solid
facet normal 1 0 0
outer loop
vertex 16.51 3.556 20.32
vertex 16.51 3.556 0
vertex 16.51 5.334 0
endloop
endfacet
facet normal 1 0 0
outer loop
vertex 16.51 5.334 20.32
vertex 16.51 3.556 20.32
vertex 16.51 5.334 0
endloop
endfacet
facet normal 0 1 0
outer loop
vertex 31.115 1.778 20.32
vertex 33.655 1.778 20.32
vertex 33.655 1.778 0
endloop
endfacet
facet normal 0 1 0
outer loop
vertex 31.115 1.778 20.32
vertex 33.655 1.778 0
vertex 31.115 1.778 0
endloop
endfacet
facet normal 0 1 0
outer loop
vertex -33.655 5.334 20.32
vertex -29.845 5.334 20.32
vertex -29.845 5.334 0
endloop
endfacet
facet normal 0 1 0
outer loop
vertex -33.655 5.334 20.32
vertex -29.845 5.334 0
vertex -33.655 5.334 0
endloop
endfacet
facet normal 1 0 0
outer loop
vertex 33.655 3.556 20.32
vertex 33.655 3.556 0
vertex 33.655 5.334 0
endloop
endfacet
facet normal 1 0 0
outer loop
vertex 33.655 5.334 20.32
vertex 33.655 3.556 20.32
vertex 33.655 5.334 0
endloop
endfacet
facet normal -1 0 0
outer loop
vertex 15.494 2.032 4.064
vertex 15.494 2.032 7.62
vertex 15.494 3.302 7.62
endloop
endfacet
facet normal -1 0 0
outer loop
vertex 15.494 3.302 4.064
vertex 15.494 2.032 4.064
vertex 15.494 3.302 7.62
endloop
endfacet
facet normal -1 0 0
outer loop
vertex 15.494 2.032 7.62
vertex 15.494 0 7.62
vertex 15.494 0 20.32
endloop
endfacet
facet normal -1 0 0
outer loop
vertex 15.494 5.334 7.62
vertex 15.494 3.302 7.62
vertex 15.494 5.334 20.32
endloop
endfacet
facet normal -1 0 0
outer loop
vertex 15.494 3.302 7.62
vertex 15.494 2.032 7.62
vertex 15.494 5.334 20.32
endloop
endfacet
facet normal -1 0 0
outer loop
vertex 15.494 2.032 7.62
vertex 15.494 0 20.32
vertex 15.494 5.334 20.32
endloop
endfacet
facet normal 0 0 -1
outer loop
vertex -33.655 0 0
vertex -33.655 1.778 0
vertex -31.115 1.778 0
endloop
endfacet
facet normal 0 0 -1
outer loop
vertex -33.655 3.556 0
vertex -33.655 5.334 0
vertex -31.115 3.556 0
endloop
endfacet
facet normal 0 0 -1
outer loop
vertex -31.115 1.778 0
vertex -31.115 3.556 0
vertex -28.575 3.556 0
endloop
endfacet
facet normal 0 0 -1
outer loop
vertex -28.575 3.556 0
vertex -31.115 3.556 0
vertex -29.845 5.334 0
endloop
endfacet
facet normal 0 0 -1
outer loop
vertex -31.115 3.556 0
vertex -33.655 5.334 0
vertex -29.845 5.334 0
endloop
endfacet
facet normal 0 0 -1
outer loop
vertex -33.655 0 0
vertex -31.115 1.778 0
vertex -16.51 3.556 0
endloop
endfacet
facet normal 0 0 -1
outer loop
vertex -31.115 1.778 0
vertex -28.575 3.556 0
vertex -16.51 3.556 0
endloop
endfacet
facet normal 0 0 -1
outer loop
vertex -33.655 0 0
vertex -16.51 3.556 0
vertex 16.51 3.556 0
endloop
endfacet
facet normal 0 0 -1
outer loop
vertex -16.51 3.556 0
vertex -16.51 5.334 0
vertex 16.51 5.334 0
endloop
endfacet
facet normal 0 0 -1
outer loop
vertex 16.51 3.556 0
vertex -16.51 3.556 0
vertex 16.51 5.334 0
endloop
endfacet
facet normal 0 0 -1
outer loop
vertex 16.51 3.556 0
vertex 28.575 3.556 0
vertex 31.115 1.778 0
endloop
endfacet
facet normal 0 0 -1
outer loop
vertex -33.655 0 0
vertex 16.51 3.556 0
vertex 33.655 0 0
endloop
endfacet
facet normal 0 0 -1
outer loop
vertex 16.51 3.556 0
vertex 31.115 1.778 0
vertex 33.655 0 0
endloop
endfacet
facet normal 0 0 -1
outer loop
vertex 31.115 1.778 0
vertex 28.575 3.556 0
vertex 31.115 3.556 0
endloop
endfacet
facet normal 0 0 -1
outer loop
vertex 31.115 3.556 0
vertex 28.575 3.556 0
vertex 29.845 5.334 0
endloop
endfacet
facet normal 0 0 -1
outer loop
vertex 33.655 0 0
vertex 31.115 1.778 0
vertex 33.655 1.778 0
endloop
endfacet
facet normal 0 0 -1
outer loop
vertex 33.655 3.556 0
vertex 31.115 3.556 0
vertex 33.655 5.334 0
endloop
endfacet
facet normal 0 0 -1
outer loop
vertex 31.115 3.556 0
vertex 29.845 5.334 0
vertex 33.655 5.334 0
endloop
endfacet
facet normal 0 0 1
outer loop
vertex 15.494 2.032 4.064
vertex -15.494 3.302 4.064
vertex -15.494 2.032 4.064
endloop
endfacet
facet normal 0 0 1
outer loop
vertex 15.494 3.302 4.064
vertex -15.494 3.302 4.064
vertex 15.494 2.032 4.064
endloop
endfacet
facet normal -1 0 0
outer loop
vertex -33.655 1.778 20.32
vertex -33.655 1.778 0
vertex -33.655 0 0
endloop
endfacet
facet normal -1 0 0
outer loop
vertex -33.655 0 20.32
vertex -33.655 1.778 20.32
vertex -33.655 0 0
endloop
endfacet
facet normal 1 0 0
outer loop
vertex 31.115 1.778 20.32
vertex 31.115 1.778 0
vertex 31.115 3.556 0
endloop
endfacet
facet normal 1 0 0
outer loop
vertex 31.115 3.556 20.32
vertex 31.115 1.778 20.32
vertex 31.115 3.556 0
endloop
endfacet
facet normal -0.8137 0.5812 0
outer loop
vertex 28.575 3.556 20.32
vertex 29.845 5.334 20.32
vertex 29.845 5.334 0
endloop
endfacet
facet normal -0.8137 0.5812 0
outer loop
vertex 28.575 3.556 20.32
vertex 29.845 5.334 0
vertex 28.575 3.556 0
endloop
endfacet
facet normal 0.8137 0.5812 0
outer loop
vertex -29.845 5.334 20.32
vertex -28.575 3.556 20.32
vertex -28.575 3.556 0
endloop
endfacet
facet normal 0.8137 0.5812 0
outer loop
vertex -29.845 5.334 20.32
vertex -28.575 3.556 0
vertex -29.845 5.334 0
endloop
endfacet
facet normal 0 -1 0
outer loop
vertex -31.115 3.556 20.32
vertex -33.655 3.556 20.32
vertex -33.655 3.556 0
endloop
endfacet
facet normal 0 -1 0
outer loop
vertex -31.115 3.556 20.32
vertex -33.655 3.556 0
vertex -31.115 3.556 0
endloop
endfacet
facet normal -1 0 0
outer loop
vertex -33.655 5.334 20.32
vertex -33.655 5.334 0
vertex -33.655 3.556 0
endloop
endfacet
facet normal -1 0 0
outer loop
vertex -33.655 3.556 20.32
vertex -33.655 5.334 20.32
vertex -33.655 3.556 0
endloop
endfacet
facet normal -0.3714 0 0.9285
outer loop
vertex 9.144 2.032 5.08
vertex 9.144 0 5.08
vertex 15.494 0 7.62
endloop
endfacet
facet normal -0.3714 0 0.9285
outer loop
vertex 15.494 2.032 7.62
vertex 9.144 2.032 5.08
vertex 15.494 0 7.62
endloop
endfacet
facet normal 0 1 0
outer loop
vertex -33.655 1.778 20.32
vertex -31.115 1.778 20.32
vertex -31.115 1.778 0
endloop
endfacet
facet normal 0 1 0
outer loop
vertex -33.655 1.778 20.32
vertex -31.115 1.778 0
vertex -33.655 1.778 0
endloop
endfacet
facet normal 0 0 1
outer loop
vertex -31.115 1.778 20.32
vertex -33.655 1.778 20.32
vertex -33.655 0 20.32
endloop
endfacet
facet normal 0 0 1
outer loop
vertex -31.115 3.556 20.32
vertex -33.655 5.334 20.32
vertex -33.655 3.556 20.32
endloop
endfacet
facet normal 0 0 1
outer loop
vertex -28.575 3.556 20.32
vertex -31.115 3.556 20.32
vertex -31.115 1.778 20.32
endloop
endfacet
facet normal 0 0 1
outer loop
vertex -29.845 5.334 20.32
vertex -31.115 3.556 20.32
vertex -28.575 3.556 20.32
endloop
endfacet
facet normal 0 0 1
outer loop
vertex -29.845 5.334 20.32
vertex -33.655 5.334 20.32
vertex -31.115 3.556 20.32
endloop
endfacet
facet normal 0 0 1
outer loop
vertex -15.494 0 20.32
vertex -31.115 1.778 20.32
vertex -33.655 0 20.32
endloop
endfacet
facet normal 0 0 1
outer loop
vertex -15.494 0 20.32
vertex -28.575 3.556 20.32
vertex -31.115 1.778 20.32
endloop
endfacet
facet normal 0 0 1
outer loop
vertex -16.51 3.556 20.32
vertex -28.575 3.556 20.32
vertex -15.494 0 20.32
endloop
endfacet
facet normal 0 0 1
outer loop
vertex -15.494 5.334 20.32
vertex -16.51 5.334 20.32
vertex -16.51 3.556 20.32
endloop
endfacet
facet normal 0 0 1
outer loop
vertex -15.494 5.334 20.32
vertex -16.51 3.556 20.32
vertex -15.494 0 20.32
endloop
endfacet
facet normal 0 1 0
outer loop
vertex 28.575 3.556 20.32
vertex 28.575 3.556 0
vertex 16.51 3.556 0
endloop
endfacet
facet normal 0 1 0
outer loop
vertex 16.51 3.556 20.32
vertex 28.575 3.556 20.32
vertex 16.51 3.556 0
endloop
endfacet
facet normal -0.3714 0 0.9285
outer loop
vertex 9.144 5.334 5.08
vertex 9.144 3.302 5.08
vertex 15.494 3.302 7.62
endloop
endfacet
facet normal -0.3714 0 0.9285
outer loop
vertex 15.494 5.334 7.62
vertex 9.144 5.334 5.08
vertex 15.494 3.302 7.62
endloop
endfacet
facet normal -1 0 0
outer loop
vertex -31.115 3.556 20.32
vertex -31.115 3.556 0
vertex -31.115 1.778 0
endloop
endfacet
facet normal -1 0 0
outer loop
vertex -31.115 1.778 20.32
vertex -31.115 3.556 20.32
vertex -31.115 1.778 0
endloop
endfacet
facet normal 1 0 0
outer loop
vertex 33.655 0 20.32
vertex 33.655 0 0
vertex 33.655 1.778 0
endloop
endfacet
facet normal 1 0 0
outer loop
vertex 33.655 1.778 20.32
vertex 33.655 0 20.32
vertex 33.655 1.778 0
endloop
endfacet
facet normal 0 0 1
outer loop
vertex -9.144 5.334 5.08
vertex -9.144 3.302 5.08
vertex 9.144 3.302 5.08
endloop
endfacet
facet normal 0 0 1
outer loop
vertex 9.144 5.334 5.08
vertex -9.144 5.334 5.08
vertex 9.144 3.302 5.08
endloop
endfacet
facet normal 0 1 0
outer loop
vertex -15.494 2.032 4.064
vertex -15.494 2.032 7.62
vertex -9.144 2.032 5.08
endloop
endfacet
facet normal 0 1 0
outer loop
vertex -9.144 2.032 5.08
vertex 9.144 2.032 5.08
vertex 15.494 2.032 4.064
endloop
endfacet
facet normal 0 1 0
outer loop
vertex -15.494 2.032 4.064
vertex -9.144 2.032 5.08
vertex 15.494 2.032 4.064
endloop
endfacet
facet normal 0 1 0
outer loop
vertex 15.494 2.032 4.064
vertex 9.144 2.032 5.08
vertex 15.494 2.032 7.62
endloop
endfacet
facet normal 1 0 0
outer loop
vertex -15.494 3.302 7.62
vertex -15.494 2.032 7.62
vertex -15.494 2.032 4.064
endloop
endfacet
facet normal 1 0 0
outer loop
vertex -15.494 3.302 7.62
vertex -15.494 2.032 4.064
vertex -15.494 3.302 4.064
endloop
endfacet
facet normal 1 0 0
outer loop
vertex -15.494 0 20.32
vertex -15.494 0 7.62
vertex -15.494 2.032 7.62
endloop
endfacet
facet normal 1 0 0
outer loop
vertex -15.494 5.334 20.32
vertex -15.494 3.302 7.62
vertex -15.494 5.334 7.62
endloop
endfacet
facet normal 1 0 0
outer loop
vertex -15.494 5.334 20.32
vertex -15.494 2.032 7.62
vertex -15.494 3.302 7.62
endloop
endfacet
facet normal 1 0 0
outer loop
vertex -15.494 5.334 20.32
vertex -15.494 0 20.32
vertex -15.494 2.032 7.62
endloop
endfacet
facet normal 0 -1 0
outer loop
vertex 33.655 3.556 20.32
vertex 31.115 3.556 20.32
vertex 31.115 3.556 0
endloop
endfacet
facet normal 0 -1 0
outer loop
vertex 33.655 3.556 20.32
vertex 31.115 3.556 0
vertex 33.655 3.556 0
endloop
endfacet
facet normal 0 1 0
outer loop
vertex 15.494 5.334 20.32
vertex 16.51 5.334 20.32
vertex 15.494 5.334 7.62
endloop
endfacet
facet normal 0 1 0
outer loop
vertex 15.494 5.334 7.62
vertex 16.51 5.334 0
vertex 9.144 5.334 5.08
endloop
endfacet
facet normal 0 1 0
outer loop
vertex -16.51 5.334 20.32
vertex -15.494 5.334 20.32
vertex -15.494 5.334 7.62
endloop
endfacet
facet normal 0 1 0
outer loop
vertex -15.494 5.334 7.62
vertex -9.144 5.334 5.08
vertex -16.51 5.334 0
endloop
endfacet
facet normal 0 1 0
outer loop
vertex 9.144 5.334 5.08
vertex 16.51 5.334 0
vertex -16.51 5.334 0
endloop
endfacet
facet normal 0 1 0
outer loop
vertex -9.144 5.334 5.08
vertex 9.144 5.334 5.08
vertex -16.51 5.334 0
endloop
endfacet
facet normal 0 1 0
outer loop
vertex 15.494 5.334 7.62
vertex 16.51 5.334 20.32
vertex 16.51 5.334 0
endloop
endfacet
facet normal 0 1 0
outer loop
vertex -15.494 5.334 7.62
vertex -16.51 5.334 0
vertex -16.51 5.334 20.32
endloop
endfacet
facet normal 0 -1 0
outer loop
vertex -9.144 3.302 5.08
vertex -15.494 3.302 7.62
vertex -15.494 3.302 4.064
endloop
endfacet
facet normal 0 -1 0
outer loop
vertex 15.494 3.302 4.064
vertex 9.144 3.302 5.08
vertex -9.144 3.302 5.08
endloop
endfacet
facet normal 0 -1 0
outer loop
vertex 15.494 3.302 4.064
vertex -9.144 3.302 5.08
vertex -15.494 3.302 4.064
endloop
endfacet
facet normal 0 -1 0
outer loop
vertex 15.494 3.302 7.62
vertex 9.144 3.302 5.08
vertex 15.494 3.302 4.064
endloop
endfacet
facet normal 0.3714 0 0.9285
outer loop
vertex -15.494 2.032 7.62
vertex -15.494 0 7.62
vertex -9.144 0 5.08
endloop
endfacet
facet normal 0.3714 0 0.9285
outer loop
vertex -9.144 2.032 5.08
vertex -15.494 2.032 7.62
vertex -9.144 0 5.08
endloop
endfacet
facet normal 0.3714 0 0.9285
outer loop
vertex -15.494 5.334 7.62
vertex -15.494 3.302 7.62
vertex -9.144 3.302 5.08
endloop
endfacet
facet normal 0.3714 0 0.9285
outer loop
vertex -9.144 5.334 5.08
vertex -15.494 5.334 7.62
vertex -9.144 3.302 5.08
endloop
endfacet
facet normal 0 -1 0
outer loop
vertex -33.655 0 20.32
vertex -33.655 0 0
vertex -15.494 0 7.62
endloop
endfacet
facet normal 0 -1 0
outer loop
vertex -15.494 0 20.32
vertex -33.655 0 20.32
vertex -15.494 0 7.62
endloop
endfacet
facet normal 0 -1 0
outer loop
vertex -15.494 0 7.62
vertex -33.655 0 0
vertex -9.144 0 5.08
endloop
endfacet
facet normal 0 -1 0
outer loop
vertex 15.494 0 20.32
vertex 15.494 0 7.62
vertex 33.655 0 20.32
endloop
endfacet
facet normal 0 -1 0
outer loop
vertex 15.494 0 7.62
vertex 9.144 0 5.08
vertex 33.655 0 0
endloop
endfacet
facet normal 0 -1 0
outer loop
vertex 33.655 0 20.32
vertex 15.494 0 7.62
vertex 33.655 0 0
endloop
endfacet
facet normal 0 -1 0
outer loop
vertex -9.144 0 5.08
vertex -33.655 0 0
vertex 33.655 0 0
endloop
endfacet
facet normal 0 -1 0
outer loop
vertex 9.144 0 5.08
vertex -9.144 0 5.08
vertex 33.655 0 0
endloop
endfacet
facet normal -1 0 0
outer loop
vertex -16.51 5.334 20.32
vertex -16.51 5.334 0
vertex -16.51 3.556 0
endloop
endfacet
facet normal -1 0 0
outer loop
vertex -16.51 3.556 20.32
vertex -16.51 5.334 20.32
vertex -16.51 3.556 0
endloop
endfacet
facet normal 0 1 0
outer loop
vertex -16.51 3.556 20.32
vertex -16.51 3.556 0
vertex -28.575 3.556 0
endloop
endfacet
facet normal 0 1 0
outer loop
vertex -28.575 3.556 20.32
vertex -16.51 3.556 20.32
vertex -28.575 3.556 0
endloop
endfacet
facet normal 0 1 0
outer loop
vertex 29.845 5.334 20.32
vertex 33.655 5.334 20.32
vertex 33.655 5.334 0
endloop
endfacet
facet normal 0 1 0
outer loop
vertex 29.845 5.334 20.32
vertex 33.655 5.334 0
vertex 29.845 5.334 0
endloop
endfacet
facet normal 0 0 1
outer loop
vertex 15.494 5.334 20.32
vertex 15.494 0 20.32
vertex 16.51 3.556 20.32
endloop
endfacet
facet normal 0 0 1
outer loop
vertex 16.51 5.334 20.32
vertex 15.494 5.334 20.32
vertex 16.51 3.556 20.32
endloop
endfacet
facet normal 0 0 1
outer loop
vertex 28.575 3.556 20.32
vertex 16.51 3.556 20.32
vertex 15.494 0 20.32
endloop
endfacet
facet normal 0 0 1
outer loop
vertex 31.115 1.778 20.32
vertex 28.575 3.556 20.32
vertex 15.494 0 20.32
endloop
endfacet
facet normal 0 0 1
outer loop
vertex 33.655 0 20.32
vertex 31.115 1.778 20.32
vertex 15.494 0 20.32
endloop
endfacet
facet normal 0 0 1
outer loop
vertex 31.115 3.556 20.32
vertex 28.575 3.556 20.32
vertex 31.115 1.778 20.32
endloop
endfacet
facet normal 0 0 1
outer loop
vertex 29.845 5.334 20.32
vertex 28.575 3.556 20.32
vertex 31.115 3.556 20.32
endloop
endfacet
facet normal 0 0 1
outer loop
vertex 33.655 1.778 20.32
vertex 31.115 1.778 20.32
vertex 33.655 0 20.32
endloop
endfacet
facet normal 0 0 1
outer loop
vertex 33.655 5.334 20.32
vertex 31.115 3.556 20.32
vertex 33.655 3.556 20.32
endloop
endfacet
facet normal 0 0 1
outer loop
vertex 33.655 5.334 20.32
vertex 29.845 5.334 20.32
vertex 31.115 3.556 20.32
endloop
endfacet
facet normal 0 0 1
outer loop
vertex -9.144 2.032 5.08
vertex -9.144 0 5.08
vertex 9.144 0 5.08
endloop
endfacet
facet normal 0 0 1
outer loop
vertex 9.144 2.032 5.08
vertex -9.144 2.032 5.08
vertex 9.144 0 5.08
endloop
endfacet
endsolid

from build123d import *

# Parameters (mm, degrees)
F1_DEPTH = 20.32
F2_W     = 30.988
F2_H     = 5.334
F3_DEPTH = 12.7
F4_W     = 30.988
F4_H     = 1.27
F5_DEPTH = 3.556
F7_DEPTH = 5.334


with BuildPart() as f1:
    # F0 (on Top) → F1 (new body)
    with BuildSketch(Plane.XY):
        Polygon((-31.115, 1.778), (-33.655, 1.778), (-33.655, 0), (33.655, 0), (33.655, 1.778), (31.115, 1.778), (31.115, 3.556), (33.655, 3.556), (33.655, 5.334), (29.845, 5.334), (28.575, 3.556), (16.51, 3.556), (16.51, 5.334), (-16.51, 5.334), (-16.51, 3.556), (-28.575, 3.556), (-29.845, 5.334), (-33.655, 5.334), (-33.655, 3.556), (-31.115, 3.556), align=None)
    extrude(amount=F1_DEPTH)

    # F2 (on face) → F3 (cut)
    with BuildSketch(Plane.XY.offset(20.32)):
        with Locations((0, 2.667)):
            Rectangle(F2_W, F2_H)
    extrude(amount=-F3_DEPTH, mode=Mode.SUBTRACT)

    # F4 (on face) → F5 (cut)
    with BuildSketch(Plane.XY.offset(7.62)):
        with Locations((0, 2.667)):
            Rectangle(F4_W, F4_H)
    extrude(amount=-F5_DEPTH, mode=Mode.SUBTRACT)

    # F6 (on face) → F7 (cut, through all)
    with BuildSketch(Plane.XZ):
        Polygon((15.494, 7.62), (-15.494, 7.62), (-9.144, 5.08), (9.144, 5.08), align=None)
    extrude(amount=-F7_DEPTH, mode=Mode.SUBTRACT)


solid = f1.part
